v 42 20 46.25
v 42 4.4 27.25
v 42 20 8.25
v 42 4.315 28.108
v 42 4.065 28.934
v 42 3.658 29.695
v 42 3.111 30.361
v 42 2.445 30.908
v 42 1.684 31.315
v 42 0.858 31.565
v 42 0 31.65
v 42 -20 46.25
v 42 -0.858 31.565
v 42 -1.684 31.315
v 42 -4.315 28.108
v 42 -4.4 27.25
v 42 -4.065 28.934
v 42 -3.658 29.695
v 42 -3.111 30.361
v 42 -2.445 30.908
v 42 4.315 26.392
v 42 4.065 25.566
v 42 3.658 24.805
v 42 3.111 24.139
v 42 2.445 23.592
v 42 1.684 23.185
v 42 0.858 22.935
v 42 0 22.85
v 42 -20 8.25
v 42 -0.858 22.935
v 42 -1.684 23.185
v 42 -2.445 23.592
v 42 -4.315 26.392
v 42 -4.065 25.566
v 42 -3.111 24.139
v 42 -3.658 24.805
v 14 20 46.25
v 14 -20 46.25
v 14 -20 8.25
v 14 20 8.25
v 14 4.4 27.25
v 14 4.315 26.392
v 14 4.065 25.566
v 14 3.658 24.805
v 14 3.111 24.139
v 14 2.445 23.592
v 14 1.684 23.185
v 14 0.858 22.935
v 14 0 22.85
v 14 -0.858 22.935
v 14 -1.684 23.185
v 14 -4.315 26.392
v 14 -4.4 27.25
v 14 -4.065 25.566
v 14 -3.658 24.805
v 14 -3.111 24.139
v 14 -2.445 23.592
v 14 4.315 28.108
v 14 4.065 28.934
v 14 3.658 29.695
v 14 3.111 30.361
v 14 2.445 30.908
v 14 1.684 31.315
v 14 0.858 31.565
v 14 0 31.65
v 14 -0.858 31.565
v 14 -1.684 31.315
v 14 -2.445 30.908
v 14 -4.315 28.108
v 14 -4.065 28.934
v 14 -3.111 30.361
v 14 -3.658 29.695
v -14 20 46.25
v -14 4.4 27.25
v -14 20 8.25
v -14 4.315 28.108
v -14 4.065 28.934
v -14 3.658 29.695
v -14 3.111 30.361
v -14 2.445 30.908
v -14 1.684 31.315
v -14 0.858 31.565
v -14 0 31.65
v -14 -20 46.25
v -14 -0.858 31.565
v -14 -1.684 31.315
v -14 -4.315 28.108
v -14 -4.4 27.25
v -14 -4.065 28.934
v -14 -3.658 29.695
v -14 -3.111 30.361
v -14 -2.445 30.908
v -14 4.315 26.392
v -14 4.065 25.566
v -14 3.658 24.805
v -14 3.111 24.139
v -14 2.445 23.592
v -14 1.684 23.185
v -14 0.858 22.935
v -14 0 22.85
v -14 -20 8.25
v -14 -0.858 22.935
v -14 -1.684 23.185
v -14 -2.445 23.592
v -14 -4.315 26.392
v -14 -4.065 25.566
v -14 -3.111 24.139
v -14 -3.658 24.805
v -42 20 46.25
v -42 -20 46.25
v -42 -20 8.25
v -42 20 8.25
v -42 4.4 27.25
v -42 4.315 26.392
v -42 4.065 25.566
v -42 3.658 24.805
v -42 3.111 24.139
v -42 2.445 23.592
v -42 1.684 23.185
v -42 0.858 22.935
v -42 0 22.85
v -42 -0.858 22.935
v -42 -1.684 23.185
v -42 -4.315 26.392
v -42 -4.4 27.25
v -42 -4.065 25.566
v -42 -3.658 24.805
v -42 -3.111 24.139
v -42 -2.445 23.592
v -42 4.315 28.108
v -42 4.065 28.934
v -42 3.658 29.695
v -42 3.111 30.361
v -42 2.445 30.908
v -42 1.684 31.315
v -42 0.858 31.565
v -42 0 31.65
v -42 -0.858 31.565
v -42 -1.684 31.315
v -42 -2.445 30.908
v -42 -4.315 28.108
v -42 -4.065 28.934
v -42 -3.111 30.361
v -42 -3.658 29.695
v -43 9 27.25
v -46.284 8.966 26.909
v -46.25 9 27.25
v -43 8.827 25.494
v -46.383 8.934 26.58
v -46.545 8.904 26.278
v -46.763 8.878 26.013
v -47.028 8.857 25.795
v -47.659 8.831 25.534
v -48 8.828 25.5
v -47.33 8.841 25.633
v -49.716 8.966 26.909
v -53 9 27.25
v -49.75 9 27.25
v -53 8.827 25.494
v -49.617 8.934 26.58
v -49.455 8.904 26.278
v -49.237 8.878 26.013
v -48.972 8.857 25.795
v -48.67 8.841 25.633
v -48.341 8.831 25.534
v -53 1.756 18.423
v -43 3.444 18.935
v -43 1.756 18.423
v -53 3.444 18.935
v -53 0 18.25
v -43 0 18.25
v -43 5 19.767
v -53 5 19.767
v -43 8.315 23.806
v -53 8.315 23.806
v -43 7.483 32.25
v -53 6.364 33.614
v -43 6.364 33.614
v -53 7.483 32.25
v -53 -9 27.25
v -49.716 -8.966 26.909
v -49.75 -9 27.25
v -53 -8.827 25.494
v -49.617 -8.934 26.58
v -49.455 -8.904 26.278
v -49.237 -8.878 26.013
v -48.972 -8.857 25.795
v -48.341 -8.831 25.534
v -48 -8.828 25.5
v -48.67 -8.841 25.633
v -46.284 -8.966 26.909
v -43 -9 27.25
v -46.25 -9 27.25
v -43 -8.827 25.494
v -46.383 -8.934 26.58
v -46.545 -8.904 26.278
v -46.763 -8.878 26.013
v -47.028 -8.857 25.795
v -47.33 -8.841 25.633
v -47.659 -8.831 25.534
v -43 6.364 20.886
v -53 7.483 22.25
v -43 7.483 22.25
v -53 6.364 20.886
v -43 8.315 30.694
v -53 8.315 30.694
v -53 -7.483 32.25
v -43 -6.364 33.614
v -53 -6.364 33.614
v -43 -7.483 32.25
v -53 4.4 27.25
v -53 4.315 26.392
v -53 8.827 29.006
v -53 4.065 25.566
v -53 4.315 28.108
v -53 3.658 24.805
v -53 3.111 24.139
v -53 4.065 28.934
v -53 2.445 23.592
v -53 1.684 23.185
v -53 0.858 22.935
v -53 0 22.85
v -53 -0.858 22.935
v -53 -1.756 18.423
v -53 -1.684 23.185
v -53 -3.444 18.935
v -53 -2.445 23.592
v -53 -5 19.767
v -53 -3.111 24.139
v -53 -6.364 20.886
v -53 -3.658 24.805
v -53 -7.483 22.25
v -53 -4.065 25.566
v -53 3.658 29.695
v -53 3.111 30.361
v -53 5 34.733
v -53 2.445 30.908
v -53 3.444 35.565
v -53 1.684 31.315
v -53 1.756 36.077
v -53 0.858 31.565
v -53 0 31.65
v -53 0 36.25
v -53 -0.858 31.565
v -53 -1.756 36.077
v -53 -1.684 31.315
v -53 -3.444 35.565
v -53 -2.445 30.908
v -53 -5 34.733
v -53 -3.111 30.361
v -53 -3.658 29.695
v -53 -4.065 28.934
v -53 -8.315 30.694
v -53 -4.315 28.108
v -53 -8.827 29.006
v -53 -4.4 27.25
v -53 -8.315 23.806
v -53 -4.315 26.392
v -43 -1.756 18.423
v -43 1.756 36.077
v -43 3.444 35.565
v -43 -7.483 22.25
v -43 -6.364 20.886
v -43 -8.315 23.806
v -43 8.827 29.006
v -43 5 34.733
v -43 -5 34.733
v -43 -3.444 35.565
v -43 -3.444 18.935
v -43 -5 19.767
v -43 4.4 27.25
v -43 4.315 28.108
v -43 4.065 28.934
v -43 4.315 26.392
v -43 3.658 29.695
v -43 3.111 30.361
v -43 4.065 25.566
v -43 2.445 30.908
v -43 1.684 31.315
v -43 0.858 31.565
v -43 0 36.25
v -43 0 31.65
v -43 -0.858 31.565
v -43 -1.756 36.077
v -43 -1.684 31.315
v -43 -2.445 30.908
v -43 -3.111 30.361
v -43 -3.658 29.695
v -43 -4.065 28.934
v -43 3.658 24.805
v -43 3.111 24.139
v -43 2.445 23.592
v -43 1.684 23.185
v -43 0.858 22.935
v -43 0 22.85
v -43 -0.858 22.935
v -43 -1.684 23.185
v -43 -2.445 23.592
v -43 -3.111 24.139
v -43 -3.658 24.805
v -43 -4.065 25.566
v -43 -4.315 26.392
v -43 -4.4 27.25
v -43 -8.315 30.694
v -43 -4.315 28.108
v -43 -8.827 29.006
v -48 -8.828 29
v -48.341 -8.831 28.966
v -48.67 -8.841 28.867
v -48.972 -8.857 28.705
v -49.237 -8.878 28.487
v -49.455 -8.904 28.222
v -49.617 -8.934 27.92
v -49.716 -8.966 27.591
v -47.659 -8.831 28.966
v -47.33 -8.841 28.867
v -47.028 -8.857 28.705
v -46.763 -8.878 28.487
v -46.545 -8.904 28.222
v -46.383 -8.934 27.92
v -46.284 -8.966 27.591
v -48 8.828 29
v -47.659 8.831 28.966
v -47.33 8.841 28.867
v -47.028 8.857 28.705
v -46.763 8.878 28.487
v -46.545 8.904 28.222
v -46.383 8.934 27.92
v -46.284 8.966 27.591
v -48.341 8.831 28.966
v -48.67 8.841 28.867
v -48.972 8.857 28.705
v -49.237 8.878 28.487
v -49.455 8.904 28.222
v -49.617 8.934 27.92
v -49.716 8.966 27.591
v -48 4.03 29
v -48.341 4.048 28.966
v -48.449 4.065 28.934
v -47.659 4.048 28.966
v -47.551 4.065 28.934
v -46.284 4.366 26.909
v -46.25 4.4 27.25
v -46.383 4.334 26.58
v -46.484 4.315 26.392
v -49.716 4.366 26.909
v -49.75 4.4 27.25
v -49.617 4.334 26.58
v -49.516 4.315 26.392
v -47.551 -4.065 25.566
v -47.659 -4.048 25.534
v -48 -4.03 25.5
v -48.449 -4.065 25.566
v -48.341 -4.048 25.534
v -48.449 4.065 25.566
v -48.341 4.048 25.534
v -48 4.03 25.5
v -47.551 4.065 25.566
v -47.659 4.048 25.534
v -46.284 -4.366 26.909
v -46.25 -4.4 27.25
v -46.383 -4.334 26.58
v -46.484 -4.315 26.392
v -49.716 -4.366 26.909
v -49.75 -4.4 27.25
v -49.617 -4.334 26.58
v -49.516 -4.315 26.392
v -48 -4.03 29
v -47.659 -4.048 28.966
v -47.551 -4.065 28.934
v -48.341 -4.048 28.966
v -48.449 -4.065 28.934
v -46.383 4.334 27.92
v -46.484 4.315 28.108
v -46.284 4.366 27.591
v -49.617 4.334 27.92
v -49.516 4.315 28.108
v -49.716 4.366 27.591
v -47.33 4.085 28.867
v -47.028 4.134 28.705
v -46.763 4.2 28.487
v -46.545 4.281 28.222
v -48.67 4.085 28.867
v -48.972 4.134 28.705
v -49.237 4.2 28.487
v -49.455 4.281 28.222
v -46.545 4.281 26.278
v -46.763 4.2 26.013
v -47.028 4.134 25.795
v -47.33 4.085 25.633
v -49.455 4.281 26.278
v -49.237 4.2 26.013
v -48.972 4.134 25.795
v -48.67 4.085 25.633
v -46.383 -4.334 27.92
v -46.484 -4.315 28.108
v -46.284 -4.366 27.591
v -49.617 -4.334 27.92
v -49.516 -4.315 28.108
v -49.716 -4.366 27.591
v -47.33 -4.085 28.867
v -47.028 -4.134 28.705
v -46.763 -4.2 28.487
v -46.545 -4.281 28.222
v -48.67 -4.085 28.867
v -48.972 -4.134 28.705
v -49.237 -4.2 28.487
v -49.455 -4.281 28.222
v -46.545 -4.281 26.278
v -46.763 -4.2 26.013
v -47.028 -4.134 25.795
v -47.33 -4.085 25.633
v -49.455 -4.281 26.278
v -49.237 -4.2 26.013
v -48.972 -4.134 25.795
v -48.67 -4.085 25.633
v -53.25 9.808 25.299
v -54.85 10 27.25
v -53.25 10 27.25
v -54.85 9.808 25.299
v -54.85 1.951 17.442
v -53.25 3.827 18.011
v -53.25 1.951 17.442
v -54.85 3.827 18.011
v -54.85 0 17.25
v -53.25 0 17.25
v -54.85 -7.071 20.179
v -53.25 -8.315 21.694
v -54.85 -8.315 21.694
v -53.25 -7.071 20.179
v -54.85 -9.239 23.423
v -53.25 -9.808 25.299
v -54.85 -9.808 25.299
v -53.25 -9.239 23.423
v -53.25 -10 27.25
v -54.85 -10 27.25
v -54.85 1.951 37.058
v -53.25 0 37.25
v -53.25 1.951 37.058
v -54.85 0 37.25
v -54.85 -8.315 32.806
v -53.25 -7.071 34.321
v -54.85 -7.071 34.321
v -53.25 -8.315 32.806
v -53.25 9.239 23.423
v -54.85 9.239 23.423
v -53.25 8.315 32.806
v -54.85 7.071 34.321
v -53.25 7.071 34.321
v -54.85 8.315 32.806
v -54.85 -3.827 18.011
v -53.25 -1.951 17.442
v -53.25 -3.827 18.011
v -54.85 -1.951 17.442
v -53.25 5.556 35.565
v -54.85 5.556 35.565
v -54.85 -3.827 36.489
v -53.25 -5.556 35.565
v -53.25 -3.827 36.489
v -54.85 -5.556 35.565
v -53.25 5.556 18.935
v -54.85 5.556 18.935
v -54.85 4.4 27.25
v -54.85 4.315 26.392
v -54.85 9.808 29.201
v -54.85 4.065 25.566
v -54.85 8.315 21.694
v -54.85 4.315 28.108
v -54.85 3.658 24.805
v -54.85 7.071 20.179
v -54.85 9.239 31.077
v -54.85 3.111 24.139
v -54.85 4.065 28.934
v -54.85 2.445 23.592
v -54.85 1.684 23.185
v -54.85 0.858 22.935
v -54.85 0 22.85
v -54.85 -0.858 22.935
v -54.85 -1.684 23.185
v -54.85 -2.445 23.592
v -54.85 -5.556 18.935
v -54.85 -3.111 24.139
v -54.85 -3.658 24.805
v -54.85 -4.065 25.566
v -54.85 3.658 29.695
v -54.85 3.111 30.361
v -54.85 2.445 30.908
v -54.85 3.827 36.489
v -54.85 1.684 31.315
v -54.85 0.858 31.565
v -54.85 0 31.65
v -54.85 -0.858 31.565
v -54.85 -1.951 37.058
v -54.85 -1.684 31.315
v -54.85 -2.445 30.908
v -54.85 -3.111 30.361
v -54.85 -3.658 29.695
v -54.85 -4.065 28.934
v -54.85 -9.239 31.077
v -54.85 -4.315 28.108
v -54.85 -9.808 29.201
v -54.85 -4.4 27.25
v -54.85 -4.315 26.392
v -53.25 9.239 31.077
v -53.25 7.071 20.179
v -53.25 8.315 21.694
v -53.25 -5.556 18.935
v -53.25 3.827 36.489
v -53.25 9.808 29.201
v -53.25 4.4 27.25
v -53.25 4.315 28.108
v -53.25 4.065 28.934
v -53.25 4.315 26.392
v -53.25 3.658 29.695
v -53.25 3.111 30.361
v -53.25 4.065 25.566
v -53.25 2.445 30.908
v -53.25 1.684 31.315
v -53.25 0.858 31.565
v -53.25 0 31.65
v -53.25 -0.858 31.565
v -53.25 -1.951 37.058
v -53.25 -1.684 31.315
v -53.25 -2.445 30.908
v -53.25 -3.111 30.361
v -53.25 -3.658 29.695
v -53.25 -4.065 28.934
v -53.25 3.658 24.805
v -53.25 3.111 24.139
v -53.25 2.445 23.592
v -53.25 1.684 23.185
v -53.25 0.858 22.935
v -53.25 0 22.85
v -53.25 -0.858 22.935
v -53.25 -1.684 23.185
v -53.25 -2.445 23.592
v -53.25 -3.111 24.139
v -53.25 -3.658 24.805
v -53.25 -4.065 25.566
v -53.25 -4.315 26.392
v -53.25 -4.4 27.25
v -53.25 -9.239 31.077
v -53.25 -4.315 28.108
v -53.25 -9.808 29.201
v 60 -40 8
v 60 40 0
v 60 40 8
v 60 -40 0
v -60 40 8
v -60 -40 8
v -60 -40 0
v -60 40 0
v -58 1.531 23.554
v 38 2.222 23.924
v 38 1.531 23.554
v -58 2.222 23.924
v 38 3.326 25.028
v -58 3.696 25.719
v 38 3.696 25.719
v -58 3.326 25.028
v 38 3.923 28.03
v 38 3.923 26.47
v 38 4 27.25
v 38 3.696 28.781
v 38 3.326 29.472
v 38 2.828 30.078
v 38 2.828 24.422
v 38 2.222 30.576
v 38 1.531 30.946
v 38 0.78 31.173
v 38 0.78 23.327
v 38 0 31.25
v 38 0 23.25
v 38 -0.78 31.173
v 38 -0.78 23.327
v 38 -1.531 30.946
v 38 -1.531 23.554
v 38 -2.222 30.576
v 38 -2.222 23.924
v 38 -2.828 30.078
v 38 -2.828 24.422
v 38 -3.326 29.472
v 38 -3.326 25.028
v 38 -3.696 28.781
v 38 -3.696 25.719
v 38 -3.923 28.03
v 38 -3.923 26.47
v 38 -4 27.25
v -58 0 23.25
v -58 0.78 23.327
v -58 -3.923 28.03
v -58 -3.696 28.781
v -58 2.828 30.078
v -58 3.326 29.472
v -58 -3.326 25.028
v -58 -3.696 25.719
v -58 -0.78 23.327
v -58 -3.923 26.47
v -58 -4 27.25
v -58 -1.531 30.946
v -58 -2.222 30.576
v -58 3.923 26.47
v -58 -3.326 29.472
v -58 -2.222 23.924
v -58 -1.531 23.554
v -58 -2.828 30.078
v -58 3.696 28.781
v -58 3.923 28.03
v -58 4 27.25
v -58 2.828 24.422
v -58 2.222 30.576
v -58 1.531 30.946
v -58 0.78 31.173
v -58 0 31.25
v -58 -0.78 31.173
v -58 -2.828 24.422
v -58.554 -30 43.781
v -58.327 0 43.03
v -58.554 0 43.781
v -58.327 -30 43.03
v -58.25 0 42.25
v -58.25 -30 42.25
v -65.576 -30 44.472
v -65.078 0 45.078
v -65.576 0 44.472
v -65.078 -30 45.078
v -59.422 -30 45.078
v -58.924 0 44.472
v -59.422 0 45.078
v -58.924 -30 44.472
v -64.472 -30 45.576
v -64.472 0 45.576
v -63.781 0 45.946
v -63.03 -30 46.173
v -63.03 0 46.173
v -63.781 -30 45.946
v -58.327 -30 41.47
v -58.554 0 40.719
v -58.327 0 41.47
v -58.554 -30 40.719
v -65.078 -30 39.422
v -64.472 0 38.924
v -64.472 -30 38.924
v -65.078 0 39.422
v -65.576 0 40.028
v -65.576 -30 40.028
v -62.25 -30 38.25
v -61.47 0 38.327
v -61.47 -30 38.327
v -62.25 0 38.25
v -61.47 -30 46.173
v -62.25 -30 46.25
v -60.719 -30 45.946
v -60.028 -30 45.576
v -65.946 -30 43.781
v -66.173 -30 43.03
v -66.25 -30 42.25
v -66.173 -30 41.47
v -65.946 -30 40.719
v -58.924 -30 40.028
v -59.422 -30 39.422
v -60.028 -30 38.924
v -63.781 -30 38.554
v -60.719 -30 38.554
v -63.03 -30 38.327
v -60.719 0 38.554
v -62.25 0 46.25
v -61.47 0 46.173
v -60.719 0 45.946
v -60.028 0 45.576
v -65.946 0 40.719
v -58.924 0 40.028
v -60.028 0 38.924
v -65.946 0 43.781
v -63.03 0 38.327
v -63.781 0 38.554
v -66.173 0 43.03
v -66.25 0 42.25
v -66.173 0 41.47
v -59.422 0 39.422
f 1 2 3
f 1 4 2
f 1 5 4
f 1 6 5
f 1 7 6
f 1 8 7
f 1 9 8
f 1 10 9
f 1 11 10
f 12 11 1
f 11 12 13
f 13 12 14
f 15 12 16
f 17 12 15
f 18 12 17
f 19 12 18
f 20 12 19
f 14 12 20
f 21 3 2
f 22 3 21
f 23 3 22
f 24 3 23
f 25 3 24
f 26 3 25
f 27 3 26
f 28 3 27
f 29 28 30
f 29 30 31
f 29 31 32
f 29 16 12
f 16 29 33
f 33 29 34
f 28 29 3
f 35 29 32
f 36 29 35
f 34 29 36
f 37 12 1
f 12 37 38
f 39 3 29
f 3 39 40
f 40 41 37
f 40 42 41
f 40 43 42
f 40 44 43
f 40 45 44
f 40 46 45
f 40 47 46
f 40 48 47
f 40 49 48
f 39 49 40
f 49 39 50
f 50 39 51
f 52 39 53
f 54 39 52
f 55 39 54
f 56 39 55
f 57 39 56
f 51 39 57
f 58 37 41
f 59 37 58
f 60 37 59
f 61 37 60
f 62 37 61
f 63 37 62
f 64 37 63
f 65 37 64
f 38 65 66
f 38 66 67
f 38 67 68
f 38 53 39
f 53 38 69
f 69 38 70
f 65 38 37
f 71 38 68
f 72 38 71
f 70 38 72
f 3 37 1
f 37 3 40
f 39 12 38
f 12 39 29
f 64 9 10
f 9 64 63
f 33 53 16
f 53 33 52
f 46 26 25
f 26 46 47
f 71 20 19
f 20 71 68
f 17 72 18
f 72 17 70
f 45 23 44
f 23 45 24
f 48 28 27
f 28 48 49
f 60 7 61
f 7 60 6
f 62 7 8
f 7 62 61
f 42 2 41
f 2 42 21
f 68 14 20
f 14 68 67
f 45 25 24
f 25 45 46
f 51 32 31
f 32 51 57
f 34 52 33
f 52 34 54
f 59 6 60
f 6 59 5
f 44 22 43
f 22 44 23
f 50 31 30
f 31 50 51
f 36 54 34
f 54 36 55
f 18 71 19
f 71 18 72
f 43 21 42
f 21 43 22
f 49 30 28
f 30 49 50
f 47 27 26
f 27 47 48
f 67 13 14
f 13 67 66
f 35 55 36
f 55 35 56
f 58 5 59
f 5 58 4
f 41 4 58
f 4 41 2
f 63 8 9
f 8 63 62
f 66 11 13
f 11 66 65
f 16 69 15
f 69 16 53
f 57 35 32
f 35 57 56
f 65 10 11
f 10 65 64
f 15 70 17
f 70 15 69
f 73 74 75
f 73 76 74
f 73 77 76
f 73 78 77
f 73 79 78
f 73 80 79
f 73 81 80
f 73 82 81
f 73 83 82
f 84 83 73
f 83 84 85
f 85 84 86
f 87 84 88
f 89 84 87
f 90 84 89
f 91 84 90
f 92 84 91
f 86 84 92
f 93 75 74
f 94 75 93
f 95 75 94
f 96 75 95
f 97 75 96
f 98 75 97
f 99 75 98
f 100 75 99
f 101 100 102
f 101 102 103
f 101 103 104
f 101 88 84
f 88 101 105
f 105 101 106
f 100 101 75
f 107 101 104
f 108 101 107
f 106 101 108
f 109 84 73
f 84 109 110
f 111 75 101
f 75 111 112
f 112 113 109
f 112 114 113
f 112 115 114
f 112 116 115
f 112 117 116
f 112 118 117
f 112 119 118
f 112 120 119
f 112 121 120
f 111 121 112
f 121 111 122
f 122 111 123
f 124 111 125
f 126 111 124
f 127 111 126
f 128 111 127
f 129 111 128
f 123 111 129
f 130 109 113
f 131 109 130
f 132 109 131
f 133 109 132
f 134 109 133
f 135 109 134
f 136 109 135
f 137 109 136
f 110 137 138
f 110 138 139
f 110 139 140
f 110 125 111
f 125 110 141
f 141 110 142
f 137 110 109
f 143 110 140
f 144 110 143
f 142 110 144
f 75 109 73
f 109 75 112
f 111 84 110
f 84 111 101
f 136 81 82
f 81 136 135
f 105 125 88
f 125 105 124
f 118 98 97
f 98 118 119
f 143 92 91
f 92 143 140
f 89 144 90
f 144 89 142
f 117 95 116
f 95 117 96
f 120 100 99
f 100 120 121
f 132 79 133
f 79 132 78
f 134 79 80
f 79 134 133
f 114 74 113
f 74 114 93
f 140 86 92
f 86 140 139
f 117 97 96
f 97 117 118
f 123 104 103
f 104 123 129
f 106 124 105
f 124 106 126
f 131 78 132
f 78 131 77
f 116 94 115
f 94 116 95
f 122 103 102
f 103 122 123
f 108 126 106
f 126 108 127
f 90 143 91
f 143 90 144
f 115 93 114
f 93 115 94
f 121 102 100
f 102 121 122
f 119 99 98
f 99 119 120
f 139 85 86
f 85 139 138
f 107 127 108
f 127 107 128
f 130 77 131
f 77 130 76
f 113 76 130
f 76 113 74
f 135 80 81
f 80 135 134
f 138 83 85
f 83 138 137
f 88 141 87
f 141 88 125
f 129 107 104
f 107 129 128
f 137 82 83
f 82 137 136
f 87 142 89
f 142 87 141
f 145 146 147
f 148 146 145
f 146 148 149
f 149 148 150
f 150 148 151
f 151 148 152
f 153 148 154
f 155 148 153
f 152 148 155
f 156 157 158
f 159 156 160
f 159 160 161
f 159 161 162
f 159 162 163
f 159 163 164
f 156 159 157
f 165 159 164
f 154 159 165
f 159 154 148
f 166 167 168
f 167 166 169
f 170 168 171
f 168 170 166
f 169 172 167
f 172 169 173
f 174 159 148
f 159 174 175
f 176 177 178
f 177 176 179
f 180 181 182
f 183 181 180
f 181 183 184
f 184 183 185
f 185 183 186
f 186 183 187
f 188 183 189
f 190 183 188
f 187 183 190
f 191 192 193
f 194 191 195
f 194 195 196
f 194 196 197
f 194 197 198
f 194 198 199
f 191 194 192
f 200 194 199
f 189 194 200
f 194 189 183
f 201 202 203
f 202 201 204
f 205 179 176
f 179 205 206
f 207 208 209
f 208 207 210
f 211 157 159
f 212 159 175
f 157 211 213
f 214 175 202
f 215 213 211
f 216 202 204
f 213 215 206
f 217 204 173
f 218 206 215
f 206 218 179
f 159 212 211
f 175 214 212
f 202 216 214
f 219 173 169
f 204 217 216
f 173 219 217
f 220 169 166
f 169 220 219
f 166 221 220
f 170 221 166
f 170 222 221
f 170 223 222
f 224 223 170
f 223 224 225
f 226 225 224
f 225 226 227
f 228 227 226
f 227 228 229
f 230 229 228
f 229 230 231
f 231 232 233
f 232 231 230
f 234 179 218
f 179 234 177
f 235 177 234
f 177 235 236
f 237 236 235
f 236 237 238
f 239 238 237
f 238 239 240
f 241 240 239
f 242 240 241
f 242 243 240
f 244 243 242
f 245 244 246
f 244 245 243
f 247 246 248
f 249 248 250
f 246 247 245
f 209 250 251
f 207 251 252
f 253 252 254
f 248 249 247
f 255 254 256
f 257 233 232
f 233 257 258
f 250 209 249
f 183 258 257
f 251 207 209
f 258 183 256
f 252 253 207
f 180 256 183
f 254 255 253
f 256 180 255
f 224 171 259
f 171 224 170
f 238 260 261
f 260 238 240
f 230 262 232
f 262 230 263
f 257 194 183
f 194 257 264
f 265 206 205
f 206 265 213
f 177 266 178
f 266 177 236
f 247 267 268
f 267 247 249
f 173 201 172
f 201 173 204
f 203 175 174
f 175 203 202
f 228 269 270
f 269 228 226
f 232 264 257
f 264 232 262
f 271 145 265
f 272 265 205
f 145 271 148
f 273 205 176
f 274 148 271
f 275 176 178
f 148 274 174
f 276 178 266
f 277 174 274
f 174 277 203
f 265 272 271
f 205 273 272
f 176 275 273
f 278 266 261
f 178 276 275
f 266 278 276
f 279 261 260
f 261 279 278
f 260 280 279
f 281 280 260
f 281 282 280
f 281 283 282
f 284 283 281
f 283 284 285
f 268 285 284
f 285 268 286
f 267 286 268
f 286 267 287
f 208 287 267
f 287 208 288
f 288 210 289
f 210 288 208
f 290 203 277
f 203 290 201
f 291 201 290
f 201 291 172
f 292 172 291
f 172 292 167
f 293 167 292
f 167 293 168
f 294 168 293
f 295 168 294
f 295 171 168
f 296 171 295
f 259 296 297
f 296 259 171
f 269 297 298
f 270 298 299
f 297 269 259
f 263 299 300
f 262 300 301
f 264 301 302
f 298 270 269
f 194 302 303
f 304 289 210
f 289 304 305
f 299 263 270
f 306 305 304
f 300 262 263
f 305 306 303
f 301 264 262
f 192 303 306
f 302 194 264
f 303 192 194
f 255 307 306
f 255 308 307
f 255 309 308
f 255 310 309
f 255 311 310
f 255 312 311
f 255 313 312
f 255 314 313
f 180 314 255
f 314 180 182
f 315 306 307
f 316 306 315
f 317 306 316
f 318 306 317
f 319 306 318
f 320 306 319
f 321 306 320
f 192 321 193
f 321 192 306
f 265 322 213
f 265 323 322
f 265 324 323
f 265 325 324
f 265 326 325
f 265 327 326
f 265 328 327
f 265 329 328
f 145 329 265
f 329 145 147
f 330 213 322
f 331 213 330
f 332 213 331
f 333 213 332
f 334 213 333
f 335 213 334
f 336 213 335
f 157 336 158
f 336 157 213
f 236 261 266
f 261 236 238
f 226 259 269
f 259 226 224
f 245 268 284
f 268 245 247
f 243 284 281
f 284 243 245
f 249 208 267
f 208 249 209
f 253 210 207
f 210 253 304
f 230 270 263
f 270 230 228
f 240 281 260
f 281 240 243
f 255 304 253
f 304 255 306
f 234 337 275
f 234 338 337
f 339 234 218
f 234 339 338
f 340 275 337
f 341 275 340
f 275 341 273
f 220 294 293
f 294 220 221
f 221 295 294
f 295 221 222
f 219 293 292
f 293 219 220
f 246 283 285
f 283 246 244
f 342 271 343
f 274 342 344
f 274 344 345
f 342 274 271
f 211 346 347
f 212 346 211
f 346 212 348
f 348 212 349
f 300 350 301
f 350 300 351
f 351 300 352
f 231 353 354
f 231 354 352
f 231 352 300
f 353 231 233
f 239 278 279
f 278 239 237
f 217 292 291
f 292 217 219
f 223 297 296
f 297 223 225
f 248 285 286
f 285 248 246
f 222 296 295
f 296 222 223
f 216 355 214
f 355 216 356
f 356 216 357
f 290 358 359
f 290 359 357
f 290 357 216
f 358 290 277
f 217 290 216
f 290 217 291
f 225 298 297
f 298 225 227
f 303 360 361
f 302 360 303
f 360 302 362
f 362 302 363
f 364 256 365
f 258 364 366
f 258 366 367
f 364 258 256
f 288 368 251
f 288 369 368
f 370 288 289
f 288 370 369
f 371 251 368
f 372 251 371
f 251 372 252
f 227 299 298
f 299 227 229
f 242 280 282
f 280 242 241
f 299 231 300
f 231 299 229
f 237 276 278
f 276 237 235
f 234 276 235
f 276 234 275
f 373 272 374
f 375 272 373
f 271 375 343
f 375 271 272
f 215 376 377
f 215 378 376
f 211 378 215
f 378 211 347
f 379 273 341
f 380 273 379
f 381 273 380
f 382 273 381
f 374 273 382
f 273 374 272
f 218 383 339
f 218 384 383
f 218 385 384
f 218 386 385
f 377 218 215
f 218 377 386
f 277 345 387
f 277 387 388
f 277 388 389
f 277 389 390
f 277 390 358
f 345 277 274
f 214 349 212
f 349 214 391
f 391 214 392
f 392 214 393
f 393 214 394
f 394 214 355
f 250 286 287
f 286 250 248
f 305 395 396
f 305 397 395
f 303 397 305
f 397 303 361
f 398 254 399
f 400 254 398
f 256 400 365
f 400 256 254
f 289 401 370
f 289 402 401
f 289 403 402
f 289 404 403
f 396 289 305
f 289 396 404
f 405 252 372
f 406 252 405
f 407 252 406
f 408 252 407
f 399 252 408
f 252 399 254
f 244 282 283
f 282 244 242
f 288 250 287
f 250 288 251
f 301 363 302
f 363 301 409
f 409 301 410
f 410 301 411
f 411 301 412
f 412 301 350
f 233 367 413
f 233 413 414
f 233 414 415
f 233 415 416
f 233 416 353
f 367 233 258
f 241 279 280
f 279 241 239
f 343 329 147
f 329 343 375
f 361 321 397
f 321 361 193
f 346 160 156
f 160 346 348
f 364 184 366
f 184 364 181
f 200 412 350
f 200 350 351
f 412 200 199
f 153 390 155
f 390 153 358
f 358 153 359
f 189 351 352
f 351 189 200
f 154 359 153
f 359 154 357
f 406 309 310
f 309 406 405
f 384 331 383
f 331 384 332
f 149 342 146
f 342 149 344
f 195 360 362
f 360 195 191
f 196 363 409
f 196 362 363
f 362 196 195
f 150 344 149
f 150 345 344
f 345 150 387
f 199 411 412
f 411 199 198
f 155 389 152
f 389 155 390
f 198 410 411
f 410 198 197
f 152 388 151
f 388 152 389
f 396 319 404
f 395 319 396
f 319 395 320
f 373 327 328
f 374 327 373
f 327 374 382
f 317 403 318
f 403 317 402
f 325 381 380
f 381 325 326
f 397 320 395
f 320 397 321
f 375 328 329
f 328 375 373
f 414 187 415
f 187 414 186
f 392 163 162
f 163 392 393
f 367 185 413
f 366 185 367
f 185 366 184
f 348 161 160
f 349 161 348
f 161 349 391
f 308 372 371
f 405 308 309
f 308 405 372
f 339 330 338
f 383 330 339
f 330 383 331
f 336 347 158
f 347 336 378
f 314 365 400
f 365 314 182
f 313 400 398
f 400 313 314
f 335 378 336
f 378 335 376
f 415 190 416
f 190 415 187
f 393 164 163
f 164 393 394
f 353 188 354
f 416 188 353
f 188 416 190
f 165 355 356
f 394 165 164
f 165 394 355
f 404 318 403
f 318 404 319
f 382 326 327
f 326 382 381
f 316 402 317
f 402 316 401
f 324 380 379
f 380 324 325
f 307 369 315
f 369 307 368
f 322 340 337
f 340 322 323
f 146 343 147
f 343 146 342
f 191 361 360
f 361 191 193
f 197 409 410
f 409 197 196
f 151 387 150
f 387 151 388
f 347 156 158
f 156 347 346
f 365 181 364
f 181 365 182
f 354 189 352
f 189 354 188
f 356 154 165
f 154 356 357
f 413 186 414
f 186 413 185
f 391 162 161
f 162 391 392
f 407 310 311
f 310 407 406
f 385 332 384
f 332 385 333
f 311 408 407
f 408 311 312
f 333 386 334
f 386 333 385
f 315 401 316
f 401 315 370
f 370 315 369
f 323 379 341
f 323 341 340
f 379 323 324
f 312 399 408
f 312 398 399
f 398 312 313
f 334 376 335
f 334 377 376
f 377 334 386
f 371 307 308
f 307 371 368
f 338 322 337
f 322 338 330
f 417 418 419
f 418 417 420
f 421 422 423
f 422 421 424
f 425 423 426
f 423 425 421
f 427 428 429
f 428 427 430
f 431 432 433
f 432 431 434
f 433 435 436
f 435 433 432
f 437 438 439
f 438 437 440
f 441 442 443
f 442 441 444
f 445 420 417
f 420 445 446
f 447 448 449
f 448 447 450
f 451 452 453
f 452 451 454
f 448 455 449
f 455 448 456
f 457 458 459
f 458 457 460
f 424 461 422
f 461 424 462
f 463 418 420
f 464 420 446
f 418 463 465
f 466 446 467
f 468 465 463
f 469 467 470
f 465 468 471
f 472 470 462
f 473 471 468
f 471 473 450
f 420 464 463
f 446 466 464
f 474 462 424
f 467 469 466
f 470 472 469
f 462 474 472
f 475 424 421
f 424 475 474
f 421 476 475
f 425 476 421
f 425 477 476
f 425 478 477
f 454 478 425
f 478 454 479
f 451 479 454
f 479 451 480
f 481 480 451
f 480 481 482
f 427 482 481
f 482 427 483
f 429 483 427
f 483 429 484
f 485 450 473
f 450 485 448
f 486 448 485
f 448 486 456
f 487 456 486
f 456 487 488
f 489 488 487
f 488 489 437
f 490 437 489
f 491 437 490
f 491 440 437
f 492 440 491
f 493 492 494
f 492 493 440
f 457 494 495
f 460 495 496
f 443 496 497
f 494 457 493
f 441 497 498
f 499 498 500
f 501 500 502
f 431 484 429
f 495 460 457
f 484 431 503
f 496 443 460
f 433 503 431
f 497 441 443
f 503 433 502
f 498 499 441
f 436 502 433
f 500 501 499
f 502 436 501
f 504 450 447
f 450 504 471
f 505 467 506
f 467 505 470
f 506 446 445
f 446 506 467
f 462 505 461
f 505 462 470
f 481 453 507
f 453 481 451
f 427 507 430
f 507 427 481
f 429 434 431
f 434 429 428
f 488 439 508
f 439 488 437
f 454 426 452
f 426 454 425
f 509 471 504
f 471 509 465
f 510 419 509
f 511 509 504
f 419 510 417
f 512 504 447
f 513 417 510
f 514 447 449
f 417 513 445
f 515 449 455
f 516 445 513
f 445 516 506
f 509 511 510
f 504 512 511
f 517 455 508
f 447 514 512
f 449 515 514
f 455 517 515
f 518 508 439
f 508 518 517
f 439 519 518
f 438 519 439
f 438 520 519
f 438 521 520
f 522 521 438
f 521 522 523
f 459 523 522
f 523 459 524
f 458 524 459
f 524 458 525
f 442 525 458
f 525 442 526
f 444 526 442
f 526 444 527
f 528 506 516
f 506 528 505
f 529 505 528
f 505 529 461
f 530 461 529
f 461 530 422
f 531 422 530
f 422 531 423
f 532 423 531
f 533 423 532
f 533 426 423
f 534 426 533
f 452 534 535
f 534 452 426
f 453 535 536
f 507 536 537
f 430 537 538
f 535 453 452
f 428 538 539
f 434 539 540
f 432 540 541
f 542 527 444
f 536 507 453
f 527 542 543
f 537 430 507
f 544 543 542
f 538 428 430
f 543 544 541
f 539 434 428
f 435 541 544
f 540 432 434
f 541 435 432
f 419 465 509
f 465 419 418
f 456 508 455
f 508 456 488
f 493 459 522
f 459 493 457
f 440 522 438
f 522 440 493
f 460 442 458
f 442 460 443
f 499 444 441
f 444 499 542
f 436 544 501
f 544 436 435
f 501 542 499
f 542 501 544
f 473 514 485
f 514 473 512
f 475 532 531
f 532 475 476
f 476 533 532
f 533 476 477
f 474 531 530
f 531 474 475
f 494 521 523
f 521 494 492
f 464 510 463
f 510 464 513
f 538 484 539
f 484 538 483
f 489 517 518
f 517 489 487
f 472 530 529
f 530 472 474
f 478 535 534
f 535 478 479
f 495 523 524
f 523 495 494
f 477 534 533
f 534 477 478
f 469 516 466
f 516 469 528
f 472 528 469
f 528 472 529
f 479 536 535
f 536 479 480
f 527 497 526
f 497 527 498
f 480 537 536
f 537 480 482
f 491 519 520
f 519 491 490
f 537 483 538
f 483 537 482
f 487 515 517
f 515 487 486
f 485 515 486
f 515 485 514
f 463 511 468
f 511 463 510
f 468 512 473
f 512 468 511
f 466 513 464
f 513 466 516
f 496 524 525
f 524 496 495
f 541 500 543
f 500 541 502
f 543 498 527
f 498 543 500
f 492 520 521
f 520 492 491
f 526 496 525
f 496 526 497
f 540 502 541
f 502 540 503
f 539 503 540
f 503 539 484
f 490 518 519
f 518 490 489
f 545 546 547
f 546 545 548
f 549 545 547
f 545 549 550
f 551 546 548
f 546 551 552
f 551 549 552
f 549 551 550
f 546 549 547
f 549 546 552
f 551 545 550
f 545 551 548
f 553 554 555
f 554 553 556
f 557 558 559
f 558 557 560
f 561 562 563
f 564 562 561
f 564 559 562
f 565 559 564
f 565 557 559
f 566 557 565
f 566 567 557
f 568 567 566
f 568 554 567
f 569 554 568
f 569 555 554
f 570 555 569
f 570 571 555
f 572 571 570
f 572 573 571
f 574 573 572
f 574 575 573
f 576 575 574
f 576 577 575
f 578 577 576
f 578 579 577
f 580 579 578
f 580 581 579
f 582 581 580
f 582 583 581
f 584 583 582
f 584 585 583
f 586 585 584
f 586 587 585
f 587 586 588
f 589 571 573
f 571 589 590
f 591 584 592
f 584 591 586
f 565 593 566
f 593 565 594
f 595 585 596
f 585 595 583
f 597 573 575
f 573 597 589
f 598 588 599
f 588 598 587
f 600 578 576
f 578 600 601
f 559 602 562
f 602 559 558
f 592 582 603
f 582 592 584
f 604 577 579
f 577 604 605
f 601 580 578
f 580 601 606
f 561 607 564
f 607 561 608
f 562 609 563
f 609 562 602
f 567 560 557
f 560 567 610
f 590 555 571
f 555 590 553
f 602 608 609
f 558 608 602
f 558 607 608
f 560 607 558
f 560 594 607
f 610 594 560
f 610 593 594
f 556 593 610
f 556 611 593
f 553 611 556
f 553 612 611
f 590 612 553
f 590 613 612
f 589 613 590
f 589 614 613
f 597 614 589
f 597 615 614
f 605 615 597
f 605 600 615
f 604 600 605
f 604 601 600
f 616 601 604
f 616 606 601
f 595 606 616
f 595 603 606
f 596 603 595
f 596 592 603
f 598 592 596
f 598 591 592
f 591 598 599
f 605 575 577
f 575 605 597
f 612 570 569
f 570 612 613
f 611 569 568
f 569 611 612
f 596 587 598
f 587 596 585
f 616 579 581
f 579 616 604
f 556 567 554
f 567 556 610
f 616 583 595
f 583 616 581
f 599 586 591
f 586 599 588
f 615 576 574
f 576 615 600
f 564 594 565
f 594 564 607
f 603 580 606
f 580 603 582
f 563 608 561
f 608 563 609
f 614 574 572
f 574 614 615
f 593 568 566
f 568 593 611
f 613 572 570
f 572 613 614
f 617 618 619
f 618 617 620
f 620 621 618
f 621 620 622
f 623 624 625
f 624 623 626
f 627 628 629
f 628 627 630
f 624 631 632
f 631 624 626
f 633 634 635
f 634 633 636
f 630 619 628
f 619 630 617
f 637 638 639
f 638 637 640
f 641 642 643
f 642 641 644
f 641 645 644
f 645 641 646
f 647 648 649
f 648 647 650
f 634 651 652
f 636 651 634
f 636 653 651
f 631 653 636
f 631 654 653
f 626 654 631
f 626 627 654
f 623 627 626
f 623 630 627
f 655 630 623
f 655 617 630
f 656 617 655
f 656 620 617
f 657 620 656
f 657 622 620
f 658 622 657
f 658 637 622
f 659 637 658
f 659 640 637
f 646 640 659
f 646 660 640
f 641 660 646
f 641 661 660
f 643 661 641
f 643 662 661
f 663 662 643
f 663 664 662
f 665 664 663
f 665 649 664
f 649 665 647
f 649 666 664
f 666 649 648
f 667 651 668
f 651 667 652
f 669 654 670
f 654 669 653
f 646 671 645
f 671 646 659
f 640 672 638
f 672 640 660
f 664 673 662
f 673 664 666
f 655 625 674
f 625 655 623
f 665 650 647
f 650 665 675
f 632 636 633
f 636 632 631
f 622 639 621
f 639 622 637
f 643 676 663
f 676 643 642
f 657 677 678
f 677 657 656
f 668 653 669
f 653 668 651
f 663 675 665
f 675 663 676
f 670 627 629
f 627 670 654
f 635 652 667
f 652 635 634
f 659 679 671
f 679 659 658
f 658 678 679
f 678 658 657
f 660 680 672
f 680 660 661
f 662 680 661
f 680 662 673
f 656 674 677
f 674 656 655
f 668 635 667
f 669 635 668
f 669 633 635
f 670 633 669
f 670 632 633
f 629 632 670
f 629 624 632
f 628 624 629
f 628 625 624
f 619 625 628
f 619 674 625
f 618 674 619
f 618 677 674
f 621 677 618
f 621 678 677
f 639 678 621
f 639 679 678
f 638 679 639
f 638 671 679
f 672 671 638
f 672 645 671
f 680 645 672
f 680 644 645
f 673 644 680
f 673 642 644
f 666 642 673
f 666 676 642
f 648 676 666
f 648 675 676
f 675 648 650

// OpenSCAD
$fn = 32;

// ------------------------------------------------------------------------
// Machine vise: screw d8, jaws 28 x 38 mm
// Every part is its own module, assembly() places every instance.
// ------------------------------------------------------------------------

// --- part 1 ---
module vise_bed() {
  difference() {
    translate([-60, -40, 0]) cube([120, 80, 8]);
  }
}

// --- part 2 ---
module vise_jaw() {
  difference() {
    translate([-14, -20, 0]) cube([28, 40, 38]);
    translate([0, 0, 19]) rotate([0, 90, 0]) cylinder(h = 30, d = 8.8, center = true);
  }
}

// --- part 3 ---
module vise_screw() {
  translate([0, 0, -48]) cylinder(h = 96, d = 8);
}

// --- part 4 ---
module screw_collar() {
  difference() {
    cylinder(h = 10, d = 18);
    translate([0, 0, -1]) cylinder(h = 12, d = 8.8);
    translate([0, 0, 5]) rotate([90, 0, 0]) cylinder(h = 20, d = 3.5, center = true);
  }
}

// --- part 5 ---
module screw_washer() {
  difference() {
      translate([0, 0, 0]) cylinder(h = 1.6, d = 20);
      translate([0, 0, -1]) cylinder(h = 3.6, d = 8.8);
    }
}

// --- part 6 ---
module vise_handle() {
  cylinder(h = 30, d = 8);
}

// --- assembly ---
module assembly() {
  color([0.80, 0.24, 0.20]) translate([0, 0, 0]) rotate([0, 0, 0]) vise_bed();
  color([0.20, 0.45, 0.75]) translate([28, 0, 8.25]) rotate([0, 0, 0]) vise_jaw();
  color([0.25, 0.62, 0.32]) translate([-28, 0, 8.25]) rotate([0, 0, 0]) vise_jaw();
  color([0.92, 0.70, 0.18]) translate([-10, 0, 27.25]) rotate([0, 90, 0]) vise_screw();
  color([0.58, 0.35, 0.70]) translate([-53, 0, 27.25]) rotate([0, 90, 0]) screw_collar();
  color([0.16, 0.66, 0.66]) translate([-54.85, 0, 27.25]) rotate([0, 90, 0]) screw_washer();
  color([0.85, 0.48, 0.18]) translate([-62.25, 0, 42.25]) rotate([90, 0, 0]) vise_handle();
}

assembly();
